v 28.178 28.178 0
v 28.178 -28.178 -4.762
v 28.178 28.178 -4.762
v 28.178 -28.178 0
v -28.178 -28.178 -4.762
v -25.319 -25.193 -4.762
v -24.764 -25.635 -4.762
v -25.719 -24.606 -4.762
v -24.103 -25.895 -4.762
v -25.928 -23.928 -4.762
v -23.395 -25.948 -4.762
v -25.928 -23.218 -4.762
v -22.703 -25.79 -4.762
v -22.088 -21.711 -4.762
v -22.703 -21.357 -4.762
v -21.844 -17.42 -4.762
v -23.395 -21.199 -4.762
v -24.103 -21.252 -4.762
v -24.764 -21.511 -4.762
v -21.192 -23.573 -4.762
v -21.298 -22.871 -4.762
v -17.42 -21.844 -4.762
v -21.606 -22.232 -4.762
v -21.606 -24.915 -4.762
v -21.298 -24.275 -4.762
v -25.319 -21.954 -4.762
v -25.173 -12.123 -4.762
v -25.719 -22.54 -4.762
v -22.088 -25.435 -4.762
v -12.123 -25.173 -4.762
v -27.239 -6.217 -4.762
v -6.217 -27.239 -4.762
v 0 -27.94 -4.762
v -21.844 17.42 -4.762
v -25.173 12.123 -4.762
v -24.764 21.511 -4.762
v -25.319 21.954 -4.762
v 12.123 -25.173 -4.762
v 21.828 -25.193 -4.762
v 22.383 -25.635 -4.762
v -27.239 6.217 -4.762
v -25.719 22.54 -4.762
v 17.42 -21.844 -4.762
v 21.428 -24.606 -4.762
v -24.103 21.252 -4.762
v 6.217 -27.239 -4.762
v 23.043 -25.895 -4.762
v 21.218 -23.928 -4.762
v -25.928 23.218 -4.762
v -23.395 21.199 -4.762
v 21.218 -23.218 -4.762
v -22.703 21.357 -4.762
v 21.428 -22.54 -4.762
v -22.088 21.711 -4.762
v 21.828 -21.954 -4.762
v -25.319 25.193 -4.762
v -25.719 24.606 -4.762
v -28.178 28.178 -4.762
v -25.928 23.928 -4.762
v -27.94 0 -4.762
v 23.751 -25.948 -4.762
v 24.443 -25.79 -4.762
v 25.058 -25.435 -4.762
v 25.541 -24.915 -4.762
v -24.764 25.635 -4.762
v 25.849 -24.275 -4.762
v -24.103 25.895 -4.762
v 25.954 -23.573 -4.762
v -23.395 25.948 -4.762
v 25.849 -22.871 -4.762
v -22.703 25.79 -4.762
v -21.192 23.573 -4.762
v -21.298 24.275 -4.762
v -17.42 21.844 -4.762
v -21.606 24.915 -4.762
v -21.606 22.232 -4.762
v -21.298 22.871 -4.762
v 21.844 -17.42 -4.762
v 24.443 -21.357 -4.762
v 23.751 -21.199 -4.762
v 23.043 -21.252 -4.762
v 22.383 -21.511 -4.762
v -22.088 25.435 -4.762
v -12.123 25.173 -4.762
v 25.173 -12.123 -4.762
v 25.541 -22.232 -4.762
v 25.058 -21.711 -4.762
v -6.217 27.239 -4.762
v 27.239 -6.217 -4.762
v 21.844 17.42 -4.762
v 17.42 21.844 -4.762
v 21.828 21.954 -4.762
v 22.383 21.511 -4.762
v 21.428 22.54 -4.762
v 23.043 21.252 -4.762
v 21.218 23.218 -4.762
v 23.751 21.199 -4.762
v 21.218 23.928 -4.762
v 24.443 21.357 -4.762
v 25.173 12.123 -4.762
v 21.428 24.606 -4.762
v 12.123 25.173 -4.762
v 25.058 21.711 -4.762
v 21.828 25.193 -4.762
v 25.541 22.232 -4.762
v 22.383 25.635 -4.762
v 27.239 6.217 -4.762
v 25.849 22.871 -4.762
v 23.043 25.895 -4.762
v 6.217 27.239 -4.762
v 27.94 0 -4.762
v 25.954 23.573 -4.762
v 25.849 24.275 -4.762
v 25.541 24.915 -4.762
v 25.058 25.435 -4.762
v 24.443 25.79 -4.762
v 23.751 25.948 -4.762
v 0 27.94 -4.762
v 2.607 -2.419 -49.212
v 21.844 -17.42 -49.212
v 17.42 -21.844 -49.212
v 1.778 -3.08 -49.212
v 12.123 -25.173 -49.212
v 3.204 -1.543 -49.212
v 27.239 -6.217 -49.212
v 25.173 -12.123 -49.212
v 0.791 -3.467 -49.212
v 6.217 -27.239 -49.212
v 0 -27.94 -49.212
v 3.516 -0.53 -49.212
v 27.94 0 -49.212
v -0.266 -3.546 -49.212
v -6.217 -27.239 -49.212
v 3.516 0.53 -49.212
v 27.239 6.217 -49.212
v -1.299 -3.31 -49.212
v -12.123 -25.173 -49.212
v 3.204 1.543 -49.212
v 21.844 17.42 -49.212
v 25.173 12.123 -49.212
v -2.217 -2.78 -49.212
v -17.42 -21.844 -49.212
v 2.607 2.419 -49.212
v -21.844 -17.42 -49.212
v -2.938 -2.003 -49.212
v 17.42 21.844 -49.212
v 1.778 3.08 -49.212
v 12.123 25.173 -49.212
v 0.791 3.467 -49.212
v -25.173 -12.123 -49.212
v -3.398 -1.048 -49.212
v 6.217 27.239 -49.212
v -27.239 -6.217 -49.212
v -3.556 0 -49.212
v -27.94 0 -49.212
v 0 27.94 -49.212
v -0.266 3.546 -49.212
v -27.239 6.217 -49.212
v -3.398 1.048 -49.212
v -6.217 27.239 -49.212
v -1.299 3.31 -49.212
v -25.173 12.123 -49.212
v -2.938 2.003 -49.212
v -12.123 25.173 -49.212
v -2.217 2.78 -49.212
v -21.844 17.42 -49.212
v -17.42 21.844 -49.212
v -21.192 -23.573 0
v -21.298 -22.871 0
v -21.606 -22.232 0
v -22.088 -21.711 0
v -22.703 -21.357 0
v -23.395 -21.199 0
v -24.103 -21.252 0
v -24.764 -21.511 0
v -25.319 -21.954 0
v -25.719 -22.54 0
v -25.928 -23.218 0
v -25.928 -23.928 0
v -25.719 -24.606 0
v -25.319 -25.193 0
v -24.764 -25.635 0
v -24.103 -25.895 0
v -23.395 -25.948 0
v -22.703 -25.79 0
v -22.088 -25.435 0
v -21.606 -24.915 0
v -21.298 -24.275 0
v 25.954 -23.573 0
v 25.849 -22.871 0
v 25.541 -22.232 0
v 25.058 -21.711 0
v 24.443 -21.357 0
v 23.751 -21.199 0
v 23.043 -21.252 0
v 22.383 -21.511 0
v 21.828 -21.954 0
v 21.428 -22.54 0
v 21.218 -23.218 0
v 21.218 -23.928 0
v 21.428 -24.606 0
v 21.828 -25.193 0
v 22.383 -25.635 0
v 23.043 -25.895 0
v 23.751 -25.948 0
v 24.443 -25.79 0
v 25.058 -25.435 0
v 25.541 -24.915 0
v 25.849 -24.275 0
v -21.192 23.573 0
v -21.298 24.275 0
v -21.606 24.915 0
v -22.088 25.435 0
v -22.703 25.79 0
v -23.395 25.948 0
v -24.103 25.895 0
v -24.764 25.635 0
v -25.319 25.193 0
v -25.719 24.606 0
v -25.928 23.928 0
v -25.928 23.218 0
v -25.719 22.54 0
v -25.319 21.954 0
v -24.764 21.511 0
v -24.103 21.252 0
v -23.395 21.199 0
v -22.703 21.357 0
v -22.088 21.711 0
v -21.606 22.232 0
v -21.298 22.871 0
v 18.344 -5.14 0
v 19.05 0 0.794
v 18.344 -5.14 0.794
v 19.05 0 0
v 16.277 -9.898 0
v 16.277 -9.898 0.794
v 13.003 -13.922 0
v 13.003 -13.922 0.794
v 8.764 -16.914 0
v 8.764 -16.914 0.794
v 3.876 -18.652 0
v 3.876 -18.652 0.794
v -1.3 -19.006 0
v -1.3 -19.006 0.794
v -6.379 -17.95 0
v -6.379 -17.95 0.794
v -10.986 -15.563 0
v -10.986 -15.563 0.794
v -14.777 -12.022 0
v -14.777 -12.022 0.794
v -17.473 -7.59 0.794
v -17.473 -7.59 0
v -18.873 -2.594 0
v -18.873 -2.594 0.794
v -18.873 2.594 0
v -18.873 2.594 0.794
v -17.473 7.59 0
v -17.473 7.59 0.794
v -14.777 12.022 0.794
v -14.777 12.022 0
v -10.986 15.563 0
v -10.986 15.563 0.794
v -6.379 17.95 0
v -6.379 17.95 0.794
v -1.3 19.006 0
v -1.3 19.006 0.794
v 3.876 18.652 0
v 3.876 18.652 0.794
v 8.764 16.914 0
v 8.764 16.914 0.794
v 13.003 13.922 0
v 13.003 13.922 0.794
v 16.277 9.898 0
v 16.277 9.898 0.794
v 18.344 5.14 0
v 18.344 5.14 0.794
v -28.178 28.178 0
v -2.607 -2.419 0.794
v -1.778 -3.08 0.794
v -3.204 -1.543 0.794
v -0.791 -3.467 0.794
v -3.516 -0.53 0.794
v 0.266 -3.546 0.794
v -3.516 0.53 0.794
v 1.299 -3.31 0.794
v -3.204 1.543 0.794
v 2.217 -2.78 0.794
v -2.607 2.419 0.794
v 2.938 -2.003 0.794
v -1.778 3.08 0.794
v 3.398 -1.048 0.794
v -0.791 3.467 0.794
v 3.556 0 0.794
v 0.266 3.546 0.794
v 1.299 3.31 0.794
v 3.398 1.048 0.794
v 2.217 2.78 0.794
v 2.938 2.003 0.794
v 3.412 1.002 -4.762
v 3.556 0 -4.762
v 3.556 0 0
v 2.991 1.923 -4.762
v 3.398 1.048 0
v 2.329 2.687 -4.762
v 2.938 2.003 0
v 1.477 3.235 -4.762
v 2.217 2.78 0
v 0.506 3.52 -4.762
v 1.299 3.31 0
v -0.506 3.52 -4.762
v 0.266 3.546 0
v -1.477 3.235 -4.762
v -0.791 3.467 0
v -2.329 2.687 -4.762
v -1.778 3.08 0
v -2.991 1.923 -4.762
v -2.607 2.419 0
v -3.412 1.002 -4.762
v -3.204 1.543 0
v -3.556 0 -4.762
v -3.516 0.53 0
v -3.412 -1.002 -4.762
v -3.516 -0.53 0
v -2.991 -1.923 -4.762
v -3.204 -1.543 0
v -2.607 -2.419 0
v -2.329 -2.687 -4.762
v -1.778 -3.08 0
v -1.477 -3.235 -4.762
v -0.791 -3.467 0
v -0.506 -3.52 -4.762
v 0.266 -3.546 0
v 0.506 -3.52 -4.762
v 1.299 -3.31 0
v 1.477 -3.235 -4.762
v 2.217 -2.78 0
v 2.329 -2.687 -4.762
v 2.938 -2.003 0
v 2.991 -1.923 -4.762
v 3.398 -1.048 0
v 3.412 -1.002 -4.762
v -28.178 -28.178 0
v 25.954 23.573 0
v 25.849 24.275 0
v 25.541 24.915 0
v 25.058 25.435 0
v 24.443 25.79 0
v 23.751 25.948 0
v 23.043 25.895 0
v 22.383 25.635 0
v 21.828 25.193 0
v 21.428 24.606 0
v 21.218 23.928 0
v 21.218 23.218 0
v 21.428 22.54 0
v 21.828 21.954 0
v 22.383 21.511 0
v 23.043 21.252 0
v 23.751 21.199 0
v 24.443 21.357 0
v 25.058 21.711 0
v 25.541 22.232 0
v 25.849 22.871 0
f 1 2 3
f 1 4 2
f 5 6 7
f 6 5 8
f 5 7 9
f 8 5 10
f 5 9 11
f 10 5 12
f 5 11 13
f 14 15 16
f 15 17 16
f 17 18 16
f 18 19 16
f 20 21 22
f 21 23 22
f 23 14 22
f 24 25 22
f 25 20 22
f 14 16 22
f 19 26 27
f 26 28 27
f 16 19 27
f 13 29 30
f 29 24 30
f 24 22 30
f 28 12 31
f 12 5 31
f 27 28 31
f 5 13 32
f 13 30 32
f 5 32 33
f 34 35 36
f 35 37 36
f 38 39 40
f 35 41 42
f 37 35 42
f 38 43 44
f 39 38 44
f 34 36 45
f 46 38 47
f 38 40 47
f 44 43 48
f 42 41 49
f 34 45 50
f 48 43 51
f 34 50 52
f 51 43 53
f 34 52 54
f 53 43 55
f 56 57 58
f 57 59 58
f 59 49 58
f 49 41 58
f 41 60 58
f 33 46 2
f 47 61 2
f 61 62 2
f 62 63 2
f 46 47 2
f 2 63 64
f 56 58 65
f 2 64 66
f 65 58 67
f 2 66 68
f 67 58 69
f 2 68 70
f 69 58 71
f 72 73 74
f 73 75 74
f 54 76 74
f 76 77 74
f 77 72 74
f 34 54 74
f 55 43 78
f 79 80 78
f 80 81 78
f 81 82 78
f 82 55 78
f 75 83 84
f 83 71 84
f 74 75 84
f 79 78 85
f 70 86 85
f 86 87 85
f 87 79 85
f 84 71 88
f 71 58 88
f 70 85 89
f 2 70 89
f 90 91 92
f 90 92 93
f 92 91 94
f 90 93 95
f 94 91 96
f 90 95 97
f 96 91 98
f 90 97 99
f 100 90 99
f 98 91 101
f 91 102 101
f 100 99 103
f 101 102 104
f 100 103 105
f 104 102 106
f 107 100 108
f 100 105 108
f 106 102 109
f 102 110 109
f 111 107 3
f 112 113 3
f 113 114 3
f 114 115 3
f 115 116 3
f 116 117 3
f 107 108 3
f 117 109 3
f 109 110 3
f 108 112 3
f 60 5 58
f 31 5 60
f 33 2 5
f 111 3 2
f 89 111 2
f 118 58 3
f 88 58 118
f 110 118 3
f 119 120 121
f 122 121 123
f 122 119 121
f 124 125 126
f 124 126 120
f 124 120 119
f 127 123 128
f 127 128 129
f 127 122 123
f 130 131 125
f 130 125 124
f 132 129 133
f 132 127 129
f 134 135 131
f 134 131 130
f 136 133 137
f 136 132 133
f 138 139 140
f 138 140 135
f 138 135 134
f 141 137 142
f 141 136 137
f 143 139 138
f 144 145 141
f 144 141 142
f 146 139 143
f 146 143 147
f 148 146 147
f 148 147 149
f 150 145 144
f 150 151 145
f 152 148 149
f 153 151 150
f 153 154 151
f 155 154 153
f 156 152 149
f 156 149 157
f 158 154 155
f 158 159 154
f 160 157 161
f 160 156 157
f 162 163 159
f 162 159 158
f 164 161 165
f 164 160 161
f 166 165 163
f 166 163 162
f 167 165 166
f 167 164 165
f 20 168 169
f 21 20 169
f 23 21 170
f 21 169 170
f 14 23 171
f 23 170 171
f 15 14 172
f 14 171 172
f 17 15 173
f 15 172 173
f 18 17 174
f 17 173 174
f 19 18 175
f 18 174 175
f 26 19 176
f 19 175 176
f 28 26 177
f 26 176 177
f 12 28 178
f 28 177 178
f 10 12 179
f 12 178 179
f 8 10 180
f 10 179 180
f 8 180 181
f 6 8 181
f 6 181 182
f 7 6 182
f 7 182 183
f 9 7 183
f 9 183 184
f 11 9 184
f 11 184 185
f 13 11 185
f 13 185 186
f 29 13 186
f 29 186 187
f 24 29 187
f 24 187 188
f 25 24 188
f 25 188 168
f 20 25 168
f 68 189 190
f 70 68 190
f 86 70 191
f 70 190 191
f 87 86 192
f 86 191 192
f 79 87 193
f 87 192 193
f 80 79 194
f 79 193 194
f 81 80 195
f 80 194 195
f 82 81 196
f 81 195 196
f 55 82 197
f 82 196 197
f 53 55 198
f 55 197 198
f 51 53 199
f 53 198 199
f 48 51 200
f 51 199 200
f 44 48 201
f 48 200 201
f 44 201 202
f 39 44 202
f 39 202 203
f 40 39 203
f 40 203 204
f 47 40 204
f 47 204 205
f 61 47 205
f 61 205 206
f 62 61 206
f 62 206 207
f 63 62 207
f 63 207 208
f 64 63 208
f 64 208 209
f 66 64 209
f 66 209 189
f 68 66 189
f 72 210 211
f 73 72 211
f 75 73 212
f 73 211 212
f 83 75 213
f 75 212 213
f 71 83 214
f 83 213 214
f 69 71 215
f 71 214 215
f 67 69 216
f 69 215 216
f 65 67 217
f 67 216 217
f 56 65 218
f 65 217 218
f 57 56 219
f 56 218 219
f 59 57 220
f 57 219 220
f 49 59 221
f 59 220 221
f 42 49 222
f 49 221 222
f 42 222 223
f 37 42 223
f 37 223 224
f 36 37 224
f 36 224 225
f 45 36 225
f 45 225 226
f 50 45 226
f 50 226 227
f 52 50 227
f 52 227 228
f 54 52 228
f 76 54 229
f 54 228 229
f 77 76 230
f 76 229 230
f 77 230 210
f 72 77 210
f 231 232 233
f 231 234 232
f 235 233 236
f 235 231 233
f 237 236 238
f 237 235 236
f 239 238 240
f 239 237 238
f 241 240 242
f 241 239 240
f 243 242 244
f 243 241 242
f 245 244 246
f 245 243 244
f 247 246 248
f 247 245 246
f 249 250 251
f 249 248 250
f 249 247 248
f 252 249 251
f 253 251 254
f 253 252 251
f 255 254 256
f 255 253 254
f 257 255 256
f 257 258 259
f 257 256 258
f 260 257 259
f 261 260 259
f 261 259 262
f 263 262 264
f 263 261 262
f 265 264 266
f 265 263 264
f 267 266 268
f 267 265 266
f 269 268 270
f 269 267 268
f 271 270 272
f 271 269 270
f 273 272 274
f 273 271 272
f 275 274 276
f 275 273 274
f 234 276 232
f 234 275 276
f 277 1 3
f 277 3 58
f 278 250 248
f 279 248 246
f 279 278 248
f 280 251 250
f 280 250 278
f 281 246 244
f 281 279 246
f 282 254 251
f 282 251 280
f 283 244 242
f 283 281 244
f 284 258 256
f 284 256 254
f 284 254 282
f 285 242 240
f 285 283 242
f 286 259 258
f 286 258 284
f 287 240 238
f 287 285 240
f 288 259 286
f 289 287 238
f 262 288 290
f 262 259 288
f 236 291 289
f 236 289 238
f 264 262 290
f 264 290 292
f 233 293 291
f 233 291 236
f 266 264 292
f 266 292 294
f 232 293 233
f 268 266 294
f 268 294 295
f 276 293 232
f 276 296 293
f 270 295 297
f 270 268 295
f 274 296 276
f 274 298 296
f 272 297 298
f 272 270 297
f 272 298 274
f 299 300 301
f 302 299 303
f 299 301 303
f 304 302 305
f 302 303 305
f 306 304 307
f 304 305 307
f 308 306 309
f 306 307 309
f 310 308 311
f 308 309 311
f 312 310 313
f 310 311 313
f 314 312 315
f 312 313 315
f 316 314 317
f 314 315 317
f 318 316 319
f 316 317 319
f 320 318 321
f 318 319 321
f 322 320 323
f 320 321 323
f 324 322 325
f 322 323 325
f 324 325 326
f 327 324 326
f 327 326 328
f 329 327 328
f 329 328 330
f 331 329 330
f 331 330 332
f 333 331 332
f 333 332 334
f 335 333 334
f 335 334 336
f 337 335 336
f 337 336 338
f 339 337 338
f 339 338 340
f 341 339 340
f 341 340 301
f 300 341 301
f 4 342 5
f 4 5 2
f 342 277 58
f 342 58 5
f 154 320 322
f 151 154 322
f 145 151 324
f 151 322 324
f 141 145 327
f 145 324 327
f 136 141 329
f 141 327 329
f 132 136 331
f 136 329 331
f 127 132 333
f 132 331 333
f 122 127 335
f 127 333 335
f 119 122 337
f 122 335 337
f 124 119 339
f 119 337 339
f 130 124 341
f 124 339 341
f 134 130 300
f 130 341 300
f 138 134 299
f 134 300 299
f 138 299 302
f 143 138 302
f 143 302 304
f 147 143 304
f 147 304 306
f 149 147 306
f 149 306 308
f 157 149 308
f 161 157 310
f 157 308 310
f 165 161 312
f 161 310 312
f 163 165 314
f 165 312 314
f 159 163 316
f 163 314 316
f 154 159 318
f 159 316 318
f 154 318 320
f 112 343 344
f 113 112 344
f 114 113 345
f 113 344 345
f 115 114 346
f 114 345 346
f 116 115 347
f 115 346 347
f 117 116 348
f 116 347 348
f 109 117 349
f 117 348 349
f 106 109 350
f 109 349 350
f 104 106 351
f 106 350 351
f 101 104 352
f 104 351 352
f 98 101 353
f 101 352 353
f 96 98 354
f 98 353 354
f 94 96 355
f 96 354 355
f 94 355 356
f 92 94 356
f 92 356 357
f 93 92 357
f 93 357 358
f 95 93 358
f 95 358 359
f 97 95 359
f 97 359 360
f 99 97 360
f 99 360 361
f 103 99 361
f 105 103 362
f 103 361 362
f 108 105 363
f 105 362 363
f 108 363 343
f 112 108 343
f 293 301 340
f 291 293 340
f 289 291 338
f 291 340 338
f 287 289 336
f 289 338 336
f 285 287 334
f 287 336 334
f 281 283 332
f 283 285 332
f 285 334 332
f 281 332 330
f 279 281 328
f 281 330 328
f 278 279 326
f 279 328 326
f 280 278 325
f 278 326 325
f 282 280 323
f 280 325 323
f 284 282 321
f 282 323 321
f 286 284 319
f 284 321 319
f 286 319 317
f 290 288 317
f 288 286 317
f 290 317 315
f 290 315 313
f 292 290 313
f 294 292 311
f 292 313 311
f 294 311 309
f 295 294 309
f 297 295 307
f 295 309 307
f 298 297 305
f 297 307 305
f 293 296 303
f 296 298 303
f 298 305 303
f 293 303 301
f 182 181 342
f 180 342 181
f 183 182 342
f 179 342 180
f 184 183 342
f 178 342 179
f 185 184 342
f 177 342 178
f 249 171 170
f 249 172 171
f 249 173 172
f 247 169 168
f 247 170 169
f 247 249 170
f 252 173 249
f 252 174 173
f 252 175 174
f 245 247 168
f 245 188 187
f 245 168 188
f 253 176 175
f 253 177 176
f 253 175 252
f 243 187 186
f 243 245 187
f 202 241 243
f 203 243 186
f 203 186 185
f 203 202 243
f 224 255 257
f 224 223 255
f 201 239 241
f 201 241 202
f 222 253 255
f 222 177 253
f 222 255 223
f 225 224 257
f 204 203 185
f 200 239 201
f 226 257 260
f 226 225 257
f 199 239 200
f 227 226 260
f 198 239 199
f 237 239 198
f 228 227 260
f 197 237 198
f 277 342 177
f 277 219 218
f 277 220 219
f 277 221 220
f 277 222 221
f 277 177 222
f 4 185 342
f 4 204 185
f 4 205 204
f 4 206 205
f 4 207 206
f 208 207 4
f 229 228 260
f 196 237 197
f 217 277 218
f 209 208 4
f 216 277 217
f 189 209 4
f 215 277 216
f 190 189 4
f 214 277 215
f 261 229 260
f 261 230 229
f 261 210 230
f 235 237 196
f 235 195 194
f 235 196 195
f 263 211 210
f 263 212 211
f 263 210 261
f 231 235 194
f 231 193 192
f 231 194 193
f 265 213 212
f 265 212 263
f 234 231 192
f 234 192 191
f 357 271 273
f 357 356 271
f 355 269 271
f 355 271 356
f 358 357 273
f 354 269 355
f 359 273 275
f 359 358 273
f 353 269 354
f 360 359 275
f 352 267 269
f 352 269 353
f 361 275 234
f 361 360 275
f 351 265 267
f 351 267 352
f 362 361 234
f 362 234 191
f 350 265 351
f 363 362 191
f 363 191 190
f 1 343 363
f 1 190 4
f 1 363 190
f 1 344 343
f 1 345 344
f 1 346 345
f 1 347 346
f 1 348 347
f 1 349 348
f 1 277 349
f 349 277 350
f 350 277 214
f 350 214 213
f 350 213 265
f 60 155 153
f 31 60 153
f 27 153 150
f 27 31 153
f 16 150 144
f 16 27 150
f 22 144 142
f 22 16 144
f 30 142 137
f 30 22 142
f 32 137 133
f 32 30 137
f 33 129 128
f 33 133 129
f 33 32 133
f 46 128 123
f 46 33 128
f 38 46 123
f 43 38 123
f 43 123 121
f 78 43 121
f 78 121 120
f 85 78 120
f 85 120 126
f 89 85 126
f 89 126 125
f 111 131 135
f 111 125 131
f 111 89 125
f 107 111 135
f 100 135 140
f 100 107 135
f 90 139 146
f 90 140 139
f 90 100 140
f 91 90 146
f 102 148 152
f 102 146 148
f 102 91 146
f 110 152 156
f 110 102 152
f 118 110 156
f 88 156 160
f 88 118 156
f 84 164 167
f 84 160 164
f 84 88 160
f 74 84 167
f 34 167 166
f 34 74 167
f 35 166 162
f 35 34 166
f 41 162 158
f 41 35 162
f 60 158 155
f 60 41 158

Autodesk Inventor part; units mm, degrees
ref_plane "YZ Plane" through (0, 0, 0) normal (1, 0, 0) x (0, 1, 0)
ref_plane "XZ Plane" through (0, 0, 0) normal (0, 1, 0) x (-1, 0, 0)
ref_plane "XY Plane" through (0, 0, 0) normal (0, 0, 1) x (1, 0, 0)
sketch "Sketch1" plane through (0, 0, 0) normal (0, 0, 1) x (1, 0, 0)
  line L0 (-28.1781, -28.1781) -> (28.1781, -28.1781)
  line L1 (28.1781, -28.1781) -> (28.1781, 28.1781)
  line L2 (28.1781, 28.1781) -> (-28.1781, 28.1781)
  line L3 (-28.1781, 28.1781) -> (-28.1781, -28.1781)
  line L4 (-28.1781, -28.1781) -> (28.1781, 28.1781) construction
  line L5 (28.1781, -28.1781) -> (-28.1781, 28.1781) construction
  circle A0 centre (-23.5732, 23.5732) radius 2.3813 projected
  circle A1 centre (23.5732, 23.5732) radius 2.3813 projected
  circle A2 centre (23.5732, -23.5732) radius 2.3813 projected
  circle A3 centre (-23.5732, -23.5732) radius 2.3813 projected
  circle A4 centre (0, 0) radius 3.556 projected
  dimension "d0" = 56.3563
  dimension "d1" = 56.3563
extrude "Extrusion1" add sketch "Sketch1" against normal blind 4.7625
sketch "Sketch2" plane through (0, 0, 0) normal (0, 0, 1) x (1, 0, 0)
  circle A0 centre (0, 0) radius 3.556 projected
  circle A1 centre (0, 0) radius 3.556 projected
  circle A2 centre (0, 0) radius 19.05
  dimension "d4" = 38.1
extrude "Extrusion2" add sketch "Sketch2" along normal blind 0.7937
sketch "Sketch3" plane through (0, 0, -4.7625) normal (0, 0, -1) x (-1, 0, 0)
  circle A0 centre (0, 0) radius 3.556 projected
  circle A1 centre (0, 0) radius 27.94
  dimension "d7" = 55.88
extrude "Extrusion3" add sketch "Sketch3" along normal blind 44.45
properties part number "stepperMotorBody" material "Steel, Galvanized"
